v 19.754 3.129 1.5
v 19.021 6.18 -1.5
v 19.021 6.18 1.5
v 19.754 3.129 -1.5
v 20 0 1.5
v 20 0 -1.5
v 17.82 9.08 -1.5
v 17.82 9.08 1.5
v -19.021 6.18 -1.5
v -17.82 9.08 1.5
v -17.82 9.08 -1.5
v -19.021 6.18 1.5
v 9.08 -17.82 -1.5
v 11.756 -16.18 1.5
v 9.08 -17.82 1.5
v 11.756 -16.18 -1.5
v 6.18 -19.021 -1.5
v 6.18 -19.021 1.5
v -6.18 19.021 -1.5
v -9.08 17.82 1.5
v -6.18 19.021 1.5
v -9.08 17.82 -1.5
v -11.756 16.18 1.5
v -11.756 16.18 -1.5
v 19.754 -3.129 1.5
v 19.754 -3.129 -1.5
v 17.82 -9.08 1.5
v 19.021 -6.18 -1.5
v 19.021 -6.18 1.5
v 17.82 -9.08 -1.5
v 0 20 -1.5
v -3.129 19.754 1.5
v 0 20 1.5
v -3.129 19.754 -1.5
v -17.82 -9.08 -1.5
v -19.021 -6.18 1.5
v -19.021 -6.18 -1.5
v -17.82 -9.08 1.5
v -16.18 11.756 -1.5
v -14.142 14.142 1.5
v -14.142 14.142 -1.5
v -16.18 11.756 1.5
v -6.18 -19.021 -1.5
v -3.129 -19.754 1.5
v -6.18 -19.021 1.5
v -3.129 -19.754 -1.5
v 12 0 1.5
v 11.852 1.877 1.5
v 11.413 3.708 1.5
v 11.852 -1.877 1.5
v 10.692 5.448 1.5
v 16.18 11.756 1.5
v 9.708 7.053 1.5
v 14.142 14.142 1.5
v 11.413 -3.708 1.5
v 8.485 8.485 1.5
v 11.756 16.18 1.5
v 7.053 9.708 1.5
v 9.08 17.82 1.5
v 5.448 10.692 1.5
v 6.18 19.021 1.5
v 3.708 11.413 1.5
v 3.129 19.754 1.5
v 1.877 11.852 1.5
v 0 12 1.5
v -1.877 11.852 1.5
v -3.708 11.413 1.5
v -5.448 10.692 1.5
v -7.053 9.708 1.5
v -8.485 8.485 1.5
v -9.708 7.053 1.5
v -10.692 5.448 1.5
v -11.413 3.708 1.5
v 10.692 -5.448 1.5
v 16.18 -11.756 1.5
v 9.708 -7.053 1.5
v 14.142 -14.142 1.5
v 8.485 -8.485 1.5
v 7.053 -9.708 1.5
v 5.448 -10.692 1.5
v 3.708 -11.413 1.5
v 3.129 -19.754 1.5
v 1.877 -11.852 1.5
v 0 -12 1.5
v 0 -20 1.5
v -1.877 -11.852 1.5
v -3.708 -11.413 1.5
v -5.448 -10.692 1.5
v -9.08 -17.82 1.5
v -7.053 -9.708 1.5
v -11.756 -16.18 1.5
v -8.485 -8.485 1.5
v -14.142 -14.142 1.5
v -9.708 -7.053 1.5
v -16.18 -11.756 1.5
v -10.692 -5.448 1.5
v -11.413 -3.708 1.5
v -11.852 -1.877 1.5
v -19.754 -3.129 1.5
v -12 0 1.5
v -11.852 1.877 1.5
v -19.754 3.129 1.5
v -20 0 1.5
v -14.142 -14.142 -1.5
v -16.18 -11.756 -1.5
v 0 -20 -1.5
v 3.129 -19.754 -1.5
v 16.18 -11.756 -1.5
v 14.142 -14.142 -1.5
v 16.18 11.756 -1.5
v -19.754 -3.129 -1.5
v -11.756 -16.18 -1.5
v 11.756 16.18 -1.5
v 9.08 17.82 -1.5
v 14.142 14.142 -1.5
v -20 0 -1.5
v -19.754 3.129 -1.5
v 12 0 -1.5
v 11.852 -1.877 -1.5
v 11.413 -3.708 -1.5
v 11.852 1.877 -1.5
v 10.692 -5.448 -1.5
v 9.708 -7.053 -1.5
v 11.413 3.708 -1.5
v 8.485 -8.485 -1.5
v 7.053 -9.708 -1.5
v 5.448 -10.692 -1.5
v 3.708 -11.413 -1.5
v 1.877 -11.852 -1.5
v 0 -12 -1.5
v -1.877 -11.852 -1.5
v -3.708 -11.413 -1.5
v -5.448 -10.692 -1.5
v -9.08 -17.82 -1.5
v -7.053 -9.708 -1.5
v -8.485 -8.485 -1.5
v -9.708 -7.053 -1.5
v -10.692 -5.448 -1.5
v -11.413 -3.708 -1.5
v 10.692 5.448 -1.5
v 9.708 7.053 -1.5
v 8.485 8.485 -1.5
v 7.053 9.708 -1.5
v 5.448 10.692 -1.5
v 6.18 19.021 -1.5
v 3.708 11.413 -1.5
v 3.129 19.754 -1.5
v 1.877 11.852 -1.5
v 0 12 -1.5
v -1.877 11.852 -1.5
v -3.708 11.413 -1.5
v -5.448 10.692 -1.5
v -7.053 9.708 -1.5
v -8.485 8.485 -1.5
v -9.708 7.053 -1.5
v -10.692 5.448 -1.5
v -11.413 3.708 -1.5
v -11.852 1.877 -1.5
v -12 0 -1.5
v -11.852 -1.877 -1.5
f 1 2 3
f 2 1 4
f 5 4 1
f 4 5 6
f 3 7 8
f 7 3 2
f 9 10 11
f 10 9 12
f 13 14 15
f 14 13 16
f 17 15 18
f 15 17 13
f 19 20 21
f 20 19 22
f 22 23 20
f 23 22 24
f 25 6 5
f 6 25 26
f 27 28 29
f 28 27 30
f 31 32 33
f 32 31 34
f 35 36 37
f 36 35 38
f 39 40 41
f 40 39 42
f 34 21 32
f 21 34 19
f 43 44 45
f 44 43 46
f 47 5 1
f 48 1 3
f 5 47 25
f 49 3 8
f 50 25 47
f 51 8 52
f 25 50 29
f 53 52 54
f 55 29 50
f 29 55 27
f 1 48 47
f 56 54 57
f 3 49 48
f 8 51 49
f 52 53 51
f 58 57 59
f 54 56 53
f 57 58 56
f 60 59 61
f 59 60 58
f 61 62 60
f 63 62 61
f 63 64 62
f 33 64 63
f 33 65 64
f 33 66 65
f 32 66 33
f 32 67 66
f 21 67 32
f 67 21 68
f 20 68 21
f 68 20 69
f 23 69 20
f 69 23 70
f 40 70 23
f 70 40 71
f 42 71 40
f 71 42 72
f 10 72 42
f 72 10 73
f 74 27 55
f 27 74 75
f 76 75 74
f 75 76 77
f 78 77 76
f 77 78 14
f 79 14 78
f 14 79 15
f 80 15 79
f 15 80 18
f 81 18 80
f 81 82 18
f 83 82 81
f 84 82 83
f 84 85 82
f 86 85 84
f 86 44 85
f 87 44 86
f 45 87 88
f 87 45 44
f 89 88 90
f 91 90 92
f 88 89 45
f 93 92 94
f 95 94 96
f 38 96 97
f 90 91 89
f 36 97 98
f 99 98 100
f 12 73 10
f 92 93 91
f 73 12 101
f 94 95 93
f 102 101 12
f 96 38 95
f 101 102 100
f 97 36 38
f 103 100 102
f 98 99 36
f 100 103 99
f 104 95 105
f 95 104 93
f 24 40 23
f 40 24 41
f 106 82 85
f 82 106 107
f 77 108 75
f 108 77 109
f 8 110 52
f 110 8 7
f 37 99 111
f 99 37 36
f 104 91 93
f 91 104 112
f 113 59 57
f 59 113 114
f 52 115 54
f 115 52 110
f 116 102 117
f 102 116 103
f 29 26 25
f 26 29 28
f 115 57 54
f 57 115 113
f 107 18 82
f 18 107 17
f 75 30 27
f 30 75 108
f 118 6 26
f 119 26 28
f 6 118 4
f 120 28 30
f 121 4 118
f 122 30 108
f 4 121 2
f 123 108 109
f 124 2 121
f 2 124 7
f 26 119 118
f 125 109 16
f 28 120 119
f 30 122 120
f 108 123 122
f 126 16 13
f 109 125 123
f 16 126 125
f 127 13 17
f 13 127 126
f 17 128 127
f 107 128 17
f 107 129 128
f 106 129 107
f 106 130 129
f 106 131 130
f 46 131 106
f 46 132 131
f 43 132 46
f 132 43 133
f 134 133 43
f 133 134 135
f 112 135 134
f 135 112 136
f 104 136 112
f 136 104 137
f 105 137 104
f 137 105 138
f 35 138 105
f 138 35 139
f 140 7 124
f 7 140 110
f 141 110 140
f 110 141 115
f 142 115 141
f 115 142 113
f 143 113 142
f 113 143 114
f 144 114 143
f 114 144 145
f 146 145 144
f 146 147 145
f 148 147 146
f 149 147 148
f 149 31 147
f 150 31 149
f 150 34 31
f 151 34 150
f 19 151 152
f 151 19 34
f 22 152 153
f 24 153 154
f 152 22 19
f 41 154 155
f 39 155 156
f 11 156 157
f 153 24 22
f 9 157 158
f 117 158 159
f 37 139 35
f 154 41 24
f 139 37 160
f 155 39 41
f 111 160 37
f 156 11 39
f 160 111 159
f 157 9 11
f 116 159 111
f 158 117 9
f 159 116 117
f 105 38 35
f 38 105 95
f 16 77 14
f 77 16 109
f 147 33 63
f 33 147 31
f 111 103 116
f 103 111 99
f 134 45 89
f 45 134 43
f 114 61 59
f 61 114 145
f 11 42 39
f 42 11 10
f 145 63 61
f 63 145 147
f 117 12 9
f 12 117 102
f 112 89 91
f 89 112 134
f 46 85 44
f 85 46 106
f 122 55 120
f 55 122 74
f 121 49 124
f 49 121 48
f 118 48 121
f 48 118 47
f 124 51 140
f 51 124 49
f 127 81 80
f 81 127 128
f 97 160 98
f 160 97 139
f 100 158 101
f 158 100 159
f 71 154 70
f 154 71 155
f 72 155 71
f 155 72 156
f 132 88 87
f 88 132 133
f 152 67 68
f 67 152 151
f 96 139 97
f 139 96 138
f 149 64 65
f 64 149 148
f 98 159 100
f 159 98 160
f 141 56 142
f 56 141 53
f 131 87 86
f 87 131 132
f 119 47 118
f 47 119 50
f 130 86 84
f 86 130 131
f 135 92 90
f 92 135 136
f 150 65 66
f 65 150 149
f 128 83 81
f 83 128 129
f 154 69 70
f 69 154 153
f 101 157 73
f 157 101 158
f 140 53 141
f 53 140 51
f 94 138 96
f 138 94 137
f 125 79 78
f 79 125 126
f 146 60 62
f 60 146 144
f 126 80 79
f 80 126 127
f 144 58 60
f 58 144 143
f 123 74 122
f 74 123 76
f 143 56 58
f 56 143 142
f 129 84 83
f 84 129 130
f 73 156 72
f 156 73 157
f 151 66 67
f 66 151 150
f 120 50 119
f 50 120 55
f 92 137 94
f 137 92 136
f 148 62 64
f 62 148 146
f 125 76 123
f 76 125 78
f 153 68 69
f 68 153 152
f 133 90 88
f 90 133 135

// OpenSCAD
module Washer(Di = 10,De = 20,S = 3){
    color("#86919c")
    difference(){
        cylinder(S,20,20, center= true, $fn = 40);
        cylinder(S+2,Di,Di, center= true, $fn = 40);
    }
}

Washer(12);

// Written by Nicolì Angelo (Gengio) 2024: 
// MIT License

//Permission is hereby granted, free of charge, to any person obtaining a copy of this software and associated documentation files (the "Software"), to deal in the Software without restriction, including without limitation the rights to use, copy, modify, merge, publish, distribute, sublicense, and/or sell copies of the Software, and to permit persons to whom the Software is furnished to do so, subject to the following conditions:

//The above copyright notice and this permission notice shall be included in all copies or substantial portions of the Software.

//THE SOFTWARE IS PROVIDED "AS IS", WITHOUT WARRANTY OF ANY KIND, EXPRESS OR IMPLIED, INCLUDING BUT NOT LIMITED TO THE WARRANTIES OF MERCHANTABILITY, FITNESS FOR A PARTICULAR PURPOSE AND NONINFRINGEMENT. IN NO EVENT SHALL THE AUTHORS OR COPYRIGHT HOLDERS BE LIABLE FOR ANY CLAIM, DAMAGES OR OTHER LIABILITY, WHETHER IN AN ACTION OF CONTRACT, TORT OR OTHERWISE, ARISING FROM, OUT OF OR IN CONNECTION WITH THE SOFTWARE OR THE USE OR OTHER DEALINGS IN THE SOFTWARE.
